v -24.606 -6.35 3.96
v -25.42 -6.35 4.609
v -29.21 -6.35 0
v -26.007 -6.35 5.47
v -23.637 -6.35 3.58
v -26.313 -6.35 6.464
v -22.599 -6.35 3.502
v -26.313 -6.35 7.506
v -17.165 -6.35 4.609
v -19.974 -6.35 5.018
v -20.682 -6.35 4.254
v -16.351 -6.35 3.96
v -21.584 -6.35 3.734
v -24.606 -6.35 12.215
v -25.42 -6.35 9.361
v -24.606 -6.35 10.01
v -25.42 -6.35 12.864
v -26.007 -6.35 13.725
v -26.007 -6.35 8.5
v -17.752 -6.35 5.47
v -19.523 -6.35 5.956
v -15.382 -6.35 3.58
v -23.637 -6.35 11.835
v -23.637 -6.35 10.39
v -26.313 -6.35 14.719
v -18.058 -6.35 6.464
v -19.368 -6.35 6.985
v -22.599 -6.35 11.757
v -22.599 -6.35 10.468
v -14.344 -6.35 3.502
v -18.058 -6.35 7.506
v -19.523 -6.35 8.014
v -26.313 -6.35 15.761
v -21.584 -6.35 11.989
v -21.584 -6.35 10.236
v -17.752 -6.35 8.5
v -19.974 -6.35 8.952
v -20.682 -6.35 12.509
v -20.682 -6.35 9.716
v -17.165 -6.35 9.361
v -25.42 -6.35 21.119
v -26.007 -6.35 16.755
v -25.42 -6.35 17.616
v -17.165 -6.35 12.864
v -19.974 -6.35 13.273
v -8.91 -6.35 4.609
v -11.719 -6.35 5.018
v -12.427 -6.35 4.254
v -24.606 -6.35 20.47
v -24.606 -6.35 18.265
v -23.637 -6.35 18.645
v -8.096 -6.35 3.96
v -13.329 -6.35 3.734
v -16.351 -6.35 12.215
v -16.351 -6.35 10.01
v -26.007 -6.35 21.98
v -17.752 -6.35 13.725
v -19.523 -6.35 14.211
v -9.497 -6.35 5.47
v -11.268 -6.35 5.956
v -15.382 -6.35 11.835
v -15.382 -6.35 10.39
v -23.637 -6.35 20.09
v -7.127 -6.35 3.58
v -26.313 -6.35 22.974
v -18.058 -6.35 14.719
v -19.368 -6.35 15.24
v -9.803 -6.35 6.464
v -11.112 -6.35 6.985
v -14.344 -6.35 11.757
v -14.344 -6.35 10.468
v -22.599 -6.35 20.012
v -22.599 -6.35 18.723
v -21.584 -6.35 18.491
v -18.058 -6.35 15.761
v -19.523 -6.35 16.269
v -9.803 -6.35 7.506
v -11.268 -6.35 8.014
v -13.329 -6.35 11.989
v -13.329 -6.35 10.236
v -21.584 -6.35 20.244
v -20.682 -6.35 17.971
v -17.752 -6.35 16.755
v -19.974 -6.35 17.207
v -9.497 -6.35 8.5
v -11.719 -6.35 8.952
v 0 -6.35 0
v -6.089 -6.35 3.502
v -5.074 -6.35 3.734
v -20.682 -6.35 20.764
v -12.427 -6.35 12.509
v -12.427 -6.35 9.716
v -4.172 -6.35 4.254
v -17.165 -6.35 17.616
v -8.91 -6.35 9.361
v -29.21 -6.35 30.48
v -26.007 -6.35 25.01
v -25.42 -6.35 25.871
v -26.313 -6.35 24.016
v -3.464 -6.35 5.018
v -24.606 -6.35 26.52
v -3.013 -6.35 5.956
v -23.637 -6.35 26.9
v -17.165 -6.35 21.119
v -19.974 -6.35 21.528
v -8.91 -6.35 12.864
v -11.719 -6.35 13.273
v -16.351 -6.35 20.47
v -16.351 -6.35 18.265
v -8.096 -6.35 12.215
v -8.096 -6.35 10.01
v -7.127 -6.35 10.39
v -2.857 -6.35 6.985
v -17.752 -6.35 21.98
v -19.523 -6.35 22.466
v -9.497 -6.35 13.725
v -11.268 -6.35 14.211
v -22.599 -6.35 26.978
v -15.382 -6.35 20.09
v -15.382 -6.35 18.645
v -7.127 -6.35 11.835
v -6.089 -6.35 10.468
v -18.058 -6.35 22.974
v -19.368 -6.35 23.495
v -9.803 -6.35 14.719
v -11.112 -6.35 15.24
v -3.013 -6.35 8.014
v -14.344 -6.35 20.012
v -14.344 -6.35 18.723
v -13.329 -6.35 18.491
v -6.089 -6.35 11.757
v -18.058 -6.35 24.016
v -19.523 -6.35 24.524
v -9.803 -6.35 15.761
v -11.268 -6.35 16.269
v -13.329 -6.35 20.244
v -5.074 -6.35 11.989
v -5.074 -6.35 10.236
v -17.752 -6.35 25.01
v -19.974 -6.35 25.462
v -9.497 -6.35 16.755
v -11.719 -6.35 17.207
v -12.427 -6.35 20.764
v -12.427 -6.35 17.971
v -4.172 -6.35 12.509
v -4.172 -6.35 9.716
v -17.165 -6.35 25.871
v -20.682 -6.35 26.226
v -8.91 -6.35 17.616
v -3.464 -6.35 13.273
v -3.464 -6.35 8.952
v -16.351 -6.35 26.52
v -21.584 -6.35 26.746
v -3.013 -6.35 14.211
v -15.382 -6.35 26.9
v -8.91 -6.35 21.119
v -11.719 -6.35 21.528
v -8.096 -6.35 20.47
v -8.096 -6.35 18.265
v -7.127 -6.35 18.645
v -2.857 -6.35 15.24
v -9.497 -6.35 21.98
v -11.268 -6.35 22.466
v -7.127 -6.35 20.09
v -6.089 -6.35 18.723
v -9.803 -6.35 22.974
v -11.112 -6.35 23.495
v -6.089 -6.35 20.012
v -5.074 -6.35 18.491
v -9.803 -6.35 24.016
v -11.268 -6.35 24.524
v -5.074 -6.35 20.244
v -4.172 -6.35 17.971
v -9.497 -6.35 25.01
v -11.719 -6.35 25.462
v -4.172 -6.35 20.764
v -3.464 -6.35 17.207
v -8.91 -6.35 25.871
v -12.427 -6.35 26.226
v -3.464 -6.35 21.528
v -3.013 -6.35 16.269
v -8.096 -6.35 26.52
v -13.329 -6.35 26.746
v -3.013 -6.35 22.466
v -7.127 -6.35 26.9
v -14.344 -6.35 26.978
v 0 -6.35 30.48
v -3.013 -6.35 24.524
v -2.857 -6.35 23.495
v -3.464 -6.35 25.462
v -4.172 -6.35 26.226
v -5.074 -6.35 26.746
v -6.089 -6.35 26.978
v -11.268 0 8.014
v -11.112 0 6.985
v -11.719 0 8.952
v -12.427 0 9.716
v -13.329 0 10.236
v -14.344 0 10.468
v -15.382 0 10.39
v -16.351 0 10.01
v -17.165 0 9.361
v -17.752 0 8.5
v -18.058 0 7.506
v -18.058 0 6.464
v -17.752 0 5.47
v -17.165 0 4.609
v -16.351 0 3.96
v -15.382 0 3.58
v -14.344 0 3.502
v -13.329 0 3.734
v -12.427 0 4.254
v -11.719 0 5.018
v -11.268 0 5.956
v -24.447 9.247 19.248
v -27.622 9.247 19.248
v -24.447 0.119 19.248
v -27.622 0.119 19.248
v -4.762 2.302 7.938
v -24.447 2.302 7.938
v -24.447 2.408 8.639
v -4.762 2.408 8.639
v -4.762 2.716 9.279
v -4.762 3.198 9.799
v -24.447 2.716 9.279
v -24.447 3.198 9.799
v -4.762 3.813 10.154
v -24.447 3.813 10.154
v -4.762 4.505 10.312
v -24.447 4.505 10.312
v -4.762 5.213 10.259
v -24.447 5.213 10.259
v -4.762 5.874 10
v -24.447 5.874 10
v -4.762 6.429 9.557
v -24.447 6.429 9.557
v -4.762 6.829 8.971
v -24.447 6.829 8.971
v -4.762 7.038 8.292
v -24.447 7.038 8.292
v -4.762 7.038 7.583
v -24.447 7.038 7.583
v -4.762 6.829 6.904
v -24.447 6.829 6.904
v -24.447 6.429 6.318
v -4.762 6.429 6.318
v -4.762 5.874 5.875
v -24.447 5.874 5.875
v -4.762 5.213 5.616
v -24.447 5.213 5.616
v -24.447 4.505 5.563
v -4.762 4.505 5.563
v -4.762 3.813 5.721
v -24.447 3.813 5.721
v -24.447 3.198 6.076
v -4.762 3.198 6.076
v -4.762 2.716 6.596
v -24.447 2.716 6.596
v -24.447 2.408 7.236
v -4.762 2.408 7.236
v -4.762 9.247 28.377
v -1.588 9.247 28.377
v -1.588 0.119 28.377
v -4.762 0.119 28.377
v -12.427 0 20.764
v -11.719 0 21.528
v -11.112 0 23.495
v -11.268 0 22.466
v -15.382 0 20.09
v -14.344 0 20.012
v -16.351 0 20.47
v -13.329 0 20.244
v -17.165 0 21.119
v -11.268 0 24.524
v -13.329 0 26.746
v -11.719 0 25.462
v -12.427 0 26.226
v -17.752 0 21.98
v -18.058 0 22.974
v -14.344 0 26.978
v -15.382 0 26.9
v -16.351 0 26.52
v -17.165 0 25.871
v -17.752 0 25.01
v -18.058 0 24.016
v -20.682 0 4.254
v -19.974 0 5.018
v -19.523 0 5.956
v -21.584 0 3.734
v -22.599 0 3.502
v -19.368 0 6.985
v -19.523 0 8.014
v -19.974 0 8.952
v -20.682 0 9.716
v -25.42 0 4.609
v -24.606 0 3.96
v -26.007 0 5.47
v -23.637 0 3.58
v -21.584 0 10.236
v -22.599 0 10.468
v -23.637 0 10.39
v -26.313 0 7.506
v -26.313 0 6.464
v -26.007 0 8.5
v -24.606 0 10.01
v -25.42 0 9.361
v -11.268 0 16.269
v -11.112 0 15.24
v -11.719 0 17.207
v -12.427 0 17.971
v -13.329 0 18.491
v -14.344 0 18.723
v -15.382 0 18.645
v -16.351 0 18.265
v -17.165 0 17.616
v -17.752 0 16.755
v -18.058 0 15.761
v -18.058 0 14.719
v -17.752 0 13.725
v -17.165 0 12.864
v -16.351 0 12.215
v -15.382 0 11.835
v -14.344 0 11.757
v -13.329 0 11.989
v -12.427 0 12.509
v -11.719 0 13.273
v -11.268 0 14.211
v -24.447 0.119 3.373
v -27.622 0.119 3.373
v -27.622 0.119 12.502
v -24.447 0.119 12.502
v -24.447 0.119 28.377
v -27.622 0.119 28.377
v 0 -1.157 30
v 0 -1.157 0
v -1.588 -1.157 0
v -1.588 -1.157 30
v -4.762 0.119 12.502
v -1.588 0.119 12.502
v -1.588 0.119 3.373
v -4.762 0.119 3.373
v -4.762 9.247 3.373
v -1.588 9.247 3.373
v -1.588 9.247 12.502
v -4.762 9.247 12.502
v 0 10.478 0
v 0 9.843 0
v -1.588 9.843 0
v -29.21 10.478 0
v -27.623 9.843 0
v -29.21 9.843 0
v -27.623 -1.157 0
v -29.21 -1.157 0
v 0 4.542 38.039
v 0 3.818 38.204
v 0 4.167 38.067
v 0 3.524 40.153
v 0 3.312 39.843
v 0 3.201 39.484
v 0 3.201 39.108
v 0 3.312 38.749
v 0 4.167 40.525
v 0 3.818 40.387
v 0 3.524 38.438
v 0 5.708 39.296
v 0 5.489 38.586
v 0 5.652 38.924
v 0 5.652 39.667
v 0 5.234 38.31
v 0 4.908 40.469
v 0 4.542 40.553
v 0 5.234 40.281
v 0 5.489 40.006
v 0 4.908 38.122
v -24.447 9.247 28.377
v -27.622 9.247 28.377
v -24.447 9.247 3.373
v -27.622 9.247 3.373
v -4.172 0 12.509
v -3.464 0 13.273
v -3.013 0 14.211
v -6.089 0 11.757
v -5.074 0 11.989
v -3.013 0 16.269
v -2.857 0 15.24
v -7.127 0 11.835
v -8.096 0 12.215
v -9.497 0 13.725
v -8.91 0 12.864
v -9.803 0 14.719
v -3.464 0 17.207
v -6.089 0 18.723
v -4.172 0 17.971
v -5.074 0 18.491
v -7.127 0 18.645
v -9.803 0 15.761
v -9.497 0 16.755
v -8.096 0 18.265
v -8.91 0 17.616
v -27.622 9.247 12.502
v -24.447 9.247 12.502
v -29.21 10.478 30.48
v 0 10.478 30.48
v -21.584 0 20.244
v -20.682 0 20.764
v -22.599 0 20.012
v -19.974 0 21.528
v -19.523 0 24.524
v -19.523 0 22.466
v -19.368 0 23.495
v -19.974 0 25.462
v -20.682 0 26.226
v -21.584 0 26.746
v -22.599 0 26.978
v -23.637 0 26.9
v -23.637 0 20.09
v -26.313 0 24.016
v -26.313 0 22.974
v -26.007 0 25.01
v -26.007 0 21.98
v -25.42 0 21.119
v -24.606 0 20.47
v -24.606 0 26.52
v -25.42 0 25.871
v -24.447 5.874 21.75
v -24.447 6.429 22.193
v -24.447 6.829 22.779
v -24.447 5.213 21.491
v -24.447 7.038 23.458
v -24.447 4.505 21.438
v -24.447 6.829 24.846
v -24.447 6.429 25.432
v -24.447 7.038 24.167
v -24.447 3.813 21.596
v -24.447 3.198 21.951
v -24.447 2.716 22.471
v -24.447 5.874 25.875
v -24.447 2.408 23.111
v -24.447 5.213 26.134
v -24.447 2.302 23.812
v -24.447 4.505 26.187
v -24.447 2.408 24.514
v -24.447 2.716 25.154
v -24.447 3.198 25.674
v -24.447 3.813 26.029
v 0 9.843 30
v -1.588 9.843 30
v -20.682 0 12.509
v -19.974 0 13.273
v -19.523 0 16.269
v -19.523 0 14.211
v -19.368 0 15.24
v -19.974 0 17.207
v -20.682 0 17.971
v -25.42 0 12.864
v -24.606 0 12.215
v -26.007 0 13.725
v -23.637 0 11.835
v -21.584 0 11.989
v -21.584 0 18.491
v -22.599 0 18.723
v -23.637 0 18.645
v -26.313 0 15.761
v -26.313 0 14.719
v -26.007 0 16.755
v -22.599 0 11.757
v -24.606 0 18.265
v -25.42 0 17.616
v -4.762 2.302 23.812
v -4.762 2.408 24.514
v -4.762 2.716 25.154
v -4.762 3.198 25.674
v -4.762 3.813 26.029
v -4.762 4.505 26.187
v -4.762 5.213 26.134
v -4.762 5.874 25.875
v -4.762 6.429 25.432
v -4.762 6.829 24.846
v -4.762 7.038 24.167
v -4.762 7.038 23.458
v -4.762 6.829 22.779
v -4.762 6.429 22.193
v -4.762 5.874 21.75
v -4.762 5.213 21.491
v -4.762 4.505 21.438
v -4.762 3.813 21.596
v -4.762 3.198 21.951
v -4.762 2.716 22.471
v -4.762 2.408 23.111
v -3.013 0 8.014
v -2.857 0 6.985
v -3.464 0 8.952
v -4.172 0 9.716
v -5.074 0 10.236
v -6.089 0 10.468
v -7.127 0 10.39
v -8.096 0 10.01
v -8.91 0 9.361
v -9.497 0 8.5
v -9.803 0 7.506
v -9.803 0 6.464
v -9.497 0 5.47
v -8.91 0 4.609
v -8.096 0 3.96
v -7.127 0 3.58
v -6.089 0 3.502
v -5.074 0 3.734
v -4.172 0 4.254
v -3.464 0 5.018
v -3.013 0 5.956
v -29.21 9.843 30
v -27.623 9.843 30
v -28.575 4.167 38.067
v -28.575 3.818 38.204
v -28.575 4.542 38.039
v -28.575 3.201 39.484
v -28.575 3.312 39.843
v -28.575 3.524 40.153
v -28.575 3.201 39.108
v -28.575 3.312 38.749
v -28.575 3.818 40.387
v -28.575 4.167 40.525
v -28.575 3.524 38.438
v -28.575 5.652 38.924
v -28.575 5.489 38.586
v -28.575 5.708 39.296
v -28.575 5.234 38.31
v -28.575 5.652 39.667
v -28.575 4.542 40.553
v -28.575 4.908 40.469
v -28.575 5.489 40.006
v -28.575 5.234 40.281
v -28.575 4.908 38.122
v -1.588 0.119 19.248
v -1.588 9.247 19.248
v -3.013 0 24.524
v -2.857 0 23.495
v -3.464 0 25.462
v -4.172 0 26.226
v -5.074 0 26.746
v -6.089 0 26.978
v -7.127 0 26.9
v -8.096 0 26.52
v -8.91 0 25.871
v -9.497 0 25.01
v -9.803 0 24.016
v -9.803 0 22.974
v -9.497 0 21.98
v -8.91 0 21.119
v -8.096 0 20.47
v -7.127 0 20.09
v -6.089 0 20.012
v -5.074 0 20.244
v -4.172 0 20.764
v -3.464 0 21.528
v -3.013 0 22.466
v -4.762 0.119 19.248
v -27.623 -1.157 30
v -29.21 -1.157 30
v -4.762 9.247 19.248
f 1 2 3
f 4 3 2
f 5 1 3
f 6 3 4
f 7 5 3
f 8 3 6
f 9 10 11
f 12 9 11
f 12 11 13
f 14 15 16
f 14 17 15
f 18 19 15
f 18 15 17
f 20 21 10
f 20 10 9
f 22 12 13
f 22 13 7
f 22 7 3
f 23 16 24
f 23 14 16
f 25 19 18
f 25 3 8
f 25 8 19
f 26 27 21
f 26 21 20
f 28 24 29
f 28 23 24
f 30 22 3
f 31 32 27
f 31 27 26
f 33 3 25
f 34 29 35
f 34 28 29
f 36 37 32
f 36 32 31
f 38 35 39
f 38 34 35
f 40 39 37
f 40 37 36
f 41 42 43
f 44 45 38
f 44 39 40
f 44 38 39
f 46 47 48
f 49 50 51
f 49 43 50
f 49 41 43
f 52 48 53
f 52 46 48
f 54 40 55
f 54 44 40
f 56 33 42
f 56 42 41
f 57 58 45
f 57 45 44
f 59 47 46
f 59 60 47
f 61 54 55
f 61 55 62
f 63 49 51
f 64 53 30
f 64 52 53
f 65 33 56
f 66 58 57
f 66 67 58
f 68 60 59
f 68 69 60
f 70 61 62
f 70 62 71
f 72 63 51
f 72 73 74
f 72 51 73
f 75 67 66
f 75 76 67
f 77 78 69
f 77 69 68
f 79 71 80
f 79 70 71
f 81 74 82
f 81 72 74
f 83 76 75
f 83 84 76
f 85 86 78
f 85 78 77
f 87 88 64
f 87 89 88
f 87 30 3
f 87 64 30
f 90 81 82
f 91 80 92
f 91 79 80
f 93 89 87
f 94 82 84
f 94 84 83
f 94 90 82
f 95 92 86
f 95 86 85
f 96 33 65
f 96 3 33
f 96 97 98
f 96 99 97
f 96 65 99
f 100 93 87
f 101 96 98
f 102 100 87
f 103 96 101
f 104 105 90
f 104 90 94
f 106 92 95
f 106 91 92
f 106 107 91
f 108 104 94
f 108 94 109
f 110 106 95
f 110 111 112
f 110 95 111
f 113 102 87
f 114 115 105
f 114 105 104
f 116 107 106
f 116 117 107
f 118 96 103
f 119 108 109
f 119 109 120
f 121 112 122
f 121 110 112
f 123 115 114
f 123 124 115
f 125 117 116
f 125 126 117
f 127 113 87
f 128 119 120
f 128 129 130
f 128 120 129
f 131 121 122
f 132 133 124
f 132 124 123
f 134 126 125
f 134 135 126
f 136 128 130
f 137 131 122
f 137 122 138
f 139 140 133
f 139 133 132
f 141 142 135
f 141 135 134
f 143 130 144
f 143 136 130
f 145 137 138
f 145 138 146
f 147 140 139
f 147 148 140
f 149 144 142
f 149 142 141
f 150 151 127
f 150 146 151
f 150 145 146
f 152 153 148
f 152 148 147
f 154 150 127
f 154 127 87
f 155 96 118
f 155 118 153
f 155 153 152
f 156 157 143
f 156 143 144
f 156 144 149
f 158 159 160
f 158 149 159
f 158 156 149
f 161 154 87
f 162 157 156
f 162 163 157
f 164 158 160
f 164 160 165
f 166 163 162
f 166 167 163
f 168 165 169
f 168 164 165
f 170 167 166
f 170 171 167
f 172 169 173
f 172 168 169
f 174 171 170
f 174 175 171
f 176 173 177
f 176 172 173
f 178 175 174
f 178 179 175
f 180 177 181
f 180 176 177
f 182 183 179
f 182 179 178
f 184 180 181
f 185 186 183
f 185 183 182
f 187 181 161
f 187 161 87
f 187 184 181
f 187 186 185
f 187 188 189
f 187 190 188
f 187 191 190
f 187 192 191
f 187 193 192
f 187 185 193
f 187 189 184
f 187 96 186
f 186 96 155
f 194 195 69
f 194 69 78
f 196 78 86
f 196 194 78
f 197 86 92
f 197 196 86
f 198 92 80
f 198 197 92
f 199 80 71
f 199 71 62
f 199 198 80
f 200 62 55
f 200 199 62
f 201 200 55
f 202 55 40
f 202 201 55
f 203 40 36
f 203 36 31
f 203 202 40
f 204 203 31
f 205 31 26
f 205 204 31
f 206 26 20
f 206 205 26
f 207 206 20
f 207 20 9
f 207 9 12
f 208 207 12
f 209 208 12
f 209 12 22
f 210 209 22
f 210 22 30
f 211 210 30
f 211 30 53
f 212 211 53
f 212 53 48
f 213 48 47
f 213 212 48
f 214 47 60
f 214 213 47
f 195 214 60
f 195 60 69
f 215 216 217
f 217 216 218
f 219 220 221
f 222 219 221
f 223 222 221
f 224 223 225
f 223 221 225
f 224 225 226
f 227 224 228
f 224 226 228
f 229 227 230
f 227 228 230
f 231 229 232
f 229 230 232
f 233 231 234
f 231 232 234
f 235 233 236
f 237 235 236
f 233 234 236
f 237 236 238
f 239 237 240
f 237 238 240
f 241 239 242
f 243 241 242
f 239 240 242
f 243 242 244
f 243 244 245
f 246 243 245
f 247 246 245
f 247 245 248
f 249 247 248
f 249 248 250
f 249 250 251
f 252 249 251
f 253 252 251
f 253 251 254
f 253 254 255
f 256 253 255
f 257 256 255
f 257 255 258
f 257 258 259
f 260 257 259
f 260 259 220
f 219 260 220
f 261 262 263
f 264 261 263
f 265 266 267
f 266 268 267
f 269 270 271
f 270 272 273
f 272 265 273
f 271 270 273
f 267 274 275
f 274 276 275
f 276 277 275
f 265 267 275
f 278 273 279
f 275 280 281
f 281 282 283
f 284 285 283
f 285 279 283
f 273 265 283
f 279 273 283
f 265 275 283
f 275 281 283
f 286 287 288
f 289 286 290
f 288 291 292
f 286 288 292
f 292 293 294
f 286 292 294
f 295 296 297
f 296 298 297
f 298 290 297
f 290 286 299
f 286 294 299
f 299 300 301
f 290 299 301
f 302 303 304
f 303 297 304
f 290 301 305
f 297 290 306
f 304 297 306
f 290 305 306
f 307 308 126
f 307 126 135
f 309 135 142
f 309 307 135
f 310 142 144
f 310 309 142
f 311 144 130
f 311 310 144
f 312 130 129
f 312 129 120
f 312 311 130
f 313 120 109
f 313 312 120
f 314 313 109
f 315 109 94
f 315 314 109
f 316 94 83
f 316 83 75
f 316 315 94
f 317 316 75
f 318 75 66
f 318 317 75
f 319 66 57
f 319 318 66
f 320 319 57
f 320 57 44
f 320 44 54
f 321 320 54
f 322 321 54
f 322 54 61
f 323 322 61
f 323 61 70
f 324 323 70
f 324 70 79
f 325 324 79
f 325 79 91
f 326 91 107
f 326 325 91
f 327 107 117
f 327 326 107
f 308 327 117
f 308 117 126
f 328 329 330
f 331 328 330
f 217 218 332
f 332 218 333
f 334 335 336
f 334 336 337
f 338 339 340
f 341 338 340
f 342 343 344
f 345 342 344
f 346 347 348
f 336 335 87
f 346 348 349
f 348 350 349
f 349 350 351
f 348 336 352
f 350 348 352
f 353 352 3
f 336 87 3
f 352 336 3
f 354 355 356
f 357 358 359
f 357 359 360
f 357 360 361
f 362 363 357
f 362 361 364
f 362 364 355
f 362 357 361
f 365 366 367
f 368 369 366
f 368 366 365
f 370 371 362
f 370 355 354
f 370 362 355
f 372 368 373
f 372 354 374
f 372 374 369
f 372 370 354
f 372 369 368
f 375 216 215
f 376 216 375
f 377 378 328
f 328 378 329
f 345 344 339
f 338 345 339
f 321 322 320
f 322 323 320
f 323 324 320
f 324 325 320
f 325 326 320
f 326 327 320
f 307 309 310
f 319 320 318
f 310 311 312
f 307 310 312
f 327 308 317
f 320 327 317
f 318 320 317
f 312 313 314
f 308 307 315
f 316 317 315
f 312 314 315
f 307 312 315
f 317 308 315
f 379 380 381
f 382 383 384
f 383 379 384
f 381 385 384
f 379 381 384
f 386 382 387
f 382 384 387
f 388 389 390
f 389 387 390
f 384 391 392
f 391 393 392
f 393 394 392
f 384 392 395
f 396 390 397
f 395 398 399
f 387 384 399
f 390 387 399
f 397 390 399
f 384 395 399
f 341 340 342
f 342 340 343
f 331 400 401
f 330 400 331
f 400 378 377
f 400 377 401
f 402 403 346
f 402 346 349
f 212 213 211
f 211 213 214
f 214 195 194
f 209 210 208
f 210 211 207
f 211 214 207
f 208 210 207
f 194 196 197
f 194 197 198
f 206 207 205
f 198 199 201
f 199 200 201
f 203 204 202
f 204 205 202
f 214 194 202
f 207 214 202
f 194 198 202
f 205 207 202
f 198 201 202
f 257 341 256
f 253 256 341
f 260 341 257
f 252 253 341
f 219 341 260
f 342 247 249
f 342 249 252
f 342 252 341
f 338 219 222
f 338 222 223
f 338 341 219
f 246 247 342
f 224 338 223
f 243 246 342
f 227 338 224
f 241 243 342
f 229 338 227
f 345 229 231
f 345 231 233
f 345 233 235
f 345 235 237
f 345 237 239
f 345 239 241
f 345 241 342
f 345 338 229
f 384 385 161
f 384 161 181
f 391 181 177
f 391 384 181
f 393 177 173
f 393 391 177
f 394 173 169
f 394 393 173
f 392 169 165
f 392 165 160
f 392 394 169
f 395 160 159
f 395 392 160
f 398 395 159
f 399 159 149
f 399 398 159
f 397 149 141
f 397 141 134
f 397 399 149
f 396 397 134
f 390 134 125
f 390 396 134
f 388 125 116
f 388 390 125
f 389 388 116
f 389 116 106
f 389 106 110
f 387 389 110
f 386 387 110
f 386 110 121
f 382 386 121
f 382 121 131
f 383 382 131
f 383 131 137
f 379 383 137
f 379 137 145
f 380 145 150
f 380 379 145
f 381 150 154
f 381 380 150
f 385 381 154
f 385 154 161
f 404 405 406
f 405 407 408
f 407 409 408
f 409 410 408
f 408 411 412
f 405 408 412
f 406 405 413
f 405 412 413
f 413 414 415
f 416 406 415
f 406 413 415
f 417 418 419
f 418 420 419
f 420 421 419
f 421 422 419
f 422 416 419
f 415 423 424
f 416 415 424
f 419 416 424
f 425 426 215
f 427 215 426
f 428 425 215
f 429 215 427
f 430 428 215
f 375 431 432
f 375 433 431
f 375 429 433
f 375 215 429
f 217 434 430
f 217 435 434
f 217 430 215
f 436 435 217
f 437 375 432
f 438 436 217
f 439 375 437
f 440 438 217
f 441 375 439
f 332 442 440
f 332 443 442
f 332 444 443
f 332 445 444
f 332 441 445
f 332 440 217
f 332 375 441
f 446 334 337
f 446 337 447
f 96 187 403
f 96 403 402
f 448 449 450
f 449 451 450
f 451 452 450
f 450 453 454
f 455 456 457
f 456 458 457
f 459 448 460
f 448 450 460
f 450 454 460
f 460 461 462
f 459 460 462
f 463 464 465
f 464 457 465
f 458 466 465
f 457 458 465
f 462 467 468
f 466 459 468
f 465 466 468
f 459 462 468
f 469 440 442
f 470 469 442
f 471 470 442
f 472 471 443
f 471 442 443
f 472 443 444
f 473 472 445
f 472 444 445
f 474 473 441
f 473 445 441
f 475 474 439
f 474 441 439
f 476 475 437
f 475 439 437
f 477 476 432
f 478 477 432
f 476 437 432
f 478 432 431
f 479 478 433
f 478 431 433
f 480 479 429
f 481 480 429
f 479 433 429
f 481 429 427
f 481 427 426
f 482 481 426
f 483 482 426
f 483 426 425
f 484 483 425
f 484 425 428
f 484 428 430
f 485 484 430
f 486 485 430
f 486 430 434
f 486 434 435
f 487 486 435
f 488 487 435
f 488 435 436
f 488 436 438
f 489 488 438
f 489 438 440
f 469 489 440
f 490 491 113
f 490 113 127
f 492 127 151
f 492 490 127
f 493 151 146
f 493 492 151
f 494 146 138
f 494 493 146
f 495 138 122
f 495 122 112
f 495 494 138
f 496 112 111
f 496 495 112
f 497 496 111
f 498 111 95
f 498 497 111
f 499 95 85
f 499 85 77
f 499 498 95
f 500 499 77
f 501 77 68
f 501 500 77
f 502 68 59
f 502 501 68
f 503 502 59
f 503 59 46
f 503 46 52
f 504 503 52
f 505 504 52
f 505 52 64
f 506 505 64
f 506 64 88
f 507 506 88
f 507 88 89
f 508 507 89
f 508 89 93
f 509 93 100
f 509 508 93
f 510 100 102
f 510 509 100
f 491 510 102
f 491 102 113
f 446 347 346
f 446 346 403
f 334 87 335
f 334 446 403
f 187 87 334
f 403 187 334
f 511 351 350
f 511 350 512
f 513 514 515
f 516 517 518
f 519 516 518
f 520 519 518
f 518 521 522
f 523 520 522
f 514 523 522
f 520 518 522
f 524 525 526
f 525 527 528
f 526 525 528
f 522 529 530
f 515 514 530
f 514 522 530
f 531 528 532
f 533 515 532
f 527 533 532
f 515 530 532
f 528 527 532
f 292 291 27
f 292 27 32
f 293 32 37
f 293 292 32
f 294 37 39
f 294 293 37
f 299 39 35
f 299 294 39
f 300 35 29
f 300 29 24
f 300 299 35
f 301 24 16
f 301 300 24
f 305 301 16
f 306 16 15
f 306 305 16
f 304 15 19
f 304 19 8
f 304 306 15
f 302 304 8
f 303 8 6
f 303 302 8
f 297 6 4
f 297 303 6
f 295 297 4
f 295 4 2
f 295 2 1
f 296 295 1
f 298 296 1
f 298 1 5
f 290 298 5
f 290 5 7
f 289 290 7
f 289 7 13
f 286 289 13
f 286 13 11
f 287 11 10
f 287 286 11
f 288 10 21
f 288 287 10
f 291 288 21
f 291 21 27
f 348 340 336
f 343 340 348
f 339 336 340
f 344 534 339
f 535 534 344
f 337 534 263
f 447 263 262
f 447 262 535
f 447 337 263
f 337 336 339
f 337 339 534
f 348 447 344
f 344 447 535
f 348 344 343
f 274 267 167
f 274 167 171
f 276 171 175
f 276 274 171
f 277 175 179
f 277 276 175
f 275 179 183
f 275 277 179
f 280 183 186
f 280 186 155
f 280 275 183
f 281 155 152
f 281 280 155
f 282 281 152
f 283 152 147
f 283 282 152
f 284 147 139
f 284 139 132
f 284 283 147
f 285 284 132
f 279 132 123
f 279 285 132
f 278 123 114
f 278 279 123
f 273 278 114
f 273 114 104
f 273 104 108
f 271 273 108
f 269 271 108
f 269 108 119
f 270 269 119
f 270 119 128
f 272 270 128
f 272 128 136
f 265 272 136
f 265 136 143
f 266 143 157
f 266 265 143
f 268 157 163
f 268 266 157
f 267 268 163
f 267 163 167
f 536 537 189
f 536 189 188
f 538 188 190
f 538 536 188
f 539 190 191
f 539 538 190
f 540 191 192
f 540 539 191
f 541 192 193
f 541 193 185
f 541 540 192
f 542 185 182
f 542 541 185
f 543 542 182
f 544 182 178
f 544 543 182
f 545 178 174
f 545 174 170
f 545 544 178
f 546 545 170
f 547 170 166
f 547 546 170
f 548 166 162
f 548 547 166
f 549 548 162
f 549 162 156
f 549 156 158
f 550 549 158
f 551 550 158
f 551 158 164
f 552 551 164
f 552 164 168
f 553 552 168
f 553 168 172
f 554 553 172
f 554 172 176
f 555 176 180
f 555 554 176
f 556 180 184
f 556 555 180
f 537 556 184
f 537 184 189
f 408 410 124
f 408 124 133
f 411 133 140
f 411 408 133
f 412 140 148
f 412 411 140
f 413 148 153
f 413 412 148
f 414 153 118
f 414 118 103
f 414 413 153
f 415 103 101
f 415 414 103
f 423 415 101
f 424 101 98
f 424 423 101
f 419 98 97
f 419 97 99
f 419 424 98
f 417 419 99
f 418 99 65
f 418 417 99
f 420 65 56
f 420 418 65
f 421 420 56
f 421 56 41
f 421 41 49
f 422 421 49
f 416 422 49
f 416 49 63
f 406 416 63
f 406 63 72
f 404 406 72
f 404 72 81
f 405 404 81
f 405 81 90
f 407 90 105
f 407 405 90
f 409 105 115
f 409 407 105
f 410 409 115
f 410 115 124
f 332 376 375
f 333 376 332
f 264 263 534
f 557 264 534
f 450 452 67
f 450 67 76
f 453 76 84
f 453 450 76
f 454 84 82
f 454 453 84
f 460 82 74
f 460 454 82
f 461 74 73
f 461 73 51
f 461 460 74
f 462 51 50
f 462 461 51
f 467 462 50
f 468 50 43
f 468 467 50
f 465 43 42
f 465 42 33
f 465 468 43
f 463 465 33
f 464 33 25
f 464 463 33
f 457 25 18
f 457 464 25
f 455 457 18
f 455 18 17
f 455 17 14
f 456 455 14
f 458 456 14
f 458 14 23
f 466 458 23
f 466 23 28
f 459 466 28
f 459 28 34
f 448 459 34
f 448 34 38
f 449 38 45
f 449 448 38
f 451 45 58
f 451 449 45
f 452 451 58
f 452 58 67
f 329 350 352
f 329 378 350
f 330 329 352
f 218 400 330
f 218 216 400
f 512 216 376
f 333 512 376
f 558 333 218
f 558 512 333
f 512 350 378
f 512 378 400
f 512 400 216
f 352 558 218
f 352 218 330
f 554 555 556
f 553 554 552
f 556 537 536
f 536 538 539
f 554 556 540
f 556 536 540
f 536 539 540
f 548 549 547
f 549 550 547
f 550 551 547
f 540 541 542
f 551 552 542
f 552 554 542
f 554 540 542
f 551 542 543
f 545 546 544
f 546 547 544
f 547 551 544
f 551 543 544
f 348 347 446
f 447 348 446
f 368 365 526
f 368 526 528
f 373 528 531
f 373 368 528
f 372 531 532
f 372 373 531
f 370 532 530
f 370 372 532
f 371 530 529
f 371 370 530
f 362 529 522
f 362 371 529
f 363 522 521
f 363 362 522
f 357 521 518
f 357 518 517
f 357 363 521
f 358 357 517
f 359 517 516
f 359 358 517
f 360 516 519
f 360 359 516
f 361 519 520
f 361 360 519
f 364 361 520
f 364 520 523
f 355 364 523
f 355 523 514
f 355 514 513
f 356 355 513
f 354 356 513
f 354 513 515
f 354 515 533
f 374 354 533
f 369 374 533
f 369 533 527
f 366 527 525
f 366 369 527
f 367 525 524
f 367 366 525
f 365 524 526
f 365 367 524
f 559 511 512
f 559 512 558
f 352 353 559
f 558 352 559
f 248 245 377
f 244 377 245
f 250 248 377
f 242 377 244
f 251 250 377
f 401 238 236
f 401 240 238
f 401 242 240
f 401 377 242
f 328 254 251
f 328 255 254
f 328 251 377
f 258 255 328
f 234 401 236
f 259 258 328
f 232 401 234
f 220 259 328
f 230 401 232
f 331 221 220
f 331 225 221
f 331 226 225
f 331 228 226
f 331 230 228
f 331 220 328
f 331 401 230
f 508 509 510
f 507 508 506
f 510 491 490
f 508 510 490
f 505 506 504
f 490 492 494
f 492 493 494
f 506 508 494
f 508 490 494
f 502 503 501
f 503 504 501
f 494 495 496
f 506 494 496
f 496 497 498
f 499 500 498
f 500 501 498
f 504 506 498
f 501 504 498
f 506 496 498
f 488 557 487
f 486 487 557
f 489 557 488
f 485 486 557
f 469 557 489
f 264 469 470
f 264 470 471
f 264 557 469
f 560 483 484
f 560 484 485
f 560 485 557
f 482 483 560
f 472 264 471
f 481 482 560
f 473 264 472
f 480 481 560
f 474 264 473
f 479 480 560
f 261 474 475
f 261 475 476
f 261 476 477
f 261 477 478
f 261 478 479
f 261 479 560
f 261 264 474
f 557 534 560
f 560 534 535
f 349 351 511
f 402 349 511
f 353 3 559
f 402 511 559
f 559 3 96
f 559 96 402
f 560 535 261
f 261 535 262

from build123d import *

# Parameters (mm, degrees)
F0_W      = 29.21
F0_H      = 30.48
F0_R      = 3.4925
F1_DEPTH  = 6.35
F2_W      = 29.21
F2_H      = 30.48
F3_DEPTH  = 10.4775
F4_W      = 11
F4_H      = 30
F5_DEPTH  = 1.5875
F6_W      = 11
F6_H      = 30
F7_DEPTH  = 1.5875
F8_R      = 2.38125
F9_DEPTH  = 27.6235
F10_W     = 9.128126
F10_H     = 9.128125
F12_DEPTH = 3.175
F13_DEPTH = 3.175
F14_R     = 1.260545
F15_DEPTH = 28.575


with BuildPart() as f1:
    # F0 (on Front) → F1 (new body)
    with BuildSketch(Plane.XZ):
        with Locations((-14.605, 15.24)):
            Rectangle(F0_W, F0_H)
        with Locations((-22.86, 6.985)):
            Circle(F0_R, mode=Mode.SUBTRACT)
        with Locations((-14.605, 6.985)):
            Circle(F0_R, mode=Mode.SUBTRACT)
        with Locations((-6.35, 6.985)):
            Circle(F0_R, mode=Mode.SUBTRACT)
        with Locations((-22.86, 15.24)):
            Circle(F0_R, mode=Mode.SUBTRACT)
        with Locations((-14.605, 15.24)):
            Circle(F0_R, mode=Mode.SUBTRACT)
        with Locations((-22.86, 23.495)):
            Circle(F0_R, mode=Mode.SUBTRACT)
        with Locations((-14.605, 23.495)):
            Circle(F0_R, mode=Mode.SUBTRACT)
        with Locations((-6.35, 15.24)):
            Circle(F0_R, mode=Mode.SUBTRACT)
        with Locations((-6.35, 23.495)):
            Circle(F0_R, mode=Mode.SUBTRACT)
    extrude(amount=F1_DEPTH)

    # F2 (on face) → F3 (join)
    with BuildSketch(Plane(origin=(0, 0, 0), x_dir=(-1, 0, 0), z_dir=(0, 1, 0))):
        with Locations((14.605, 15.24)):
            Rectangle(F2_W, F2_H)
    extrude(amount=F3_DEPTH)

    # F4 (on face) → F5 (cut)
    with BuildSketch(Plane.YZ):
        with Locations((4.3425, 15)):
            Rectangle(F4_W, F4_H)
    extrude(amount=-F5_DEPTH, mode=Mode.SUBTRACT)

    # F6 (on face) → F7 (cut)
    with BuildSketch(Plane(origin=(-29.21, 0, 0), x_dir=(0, -1, 0), z_dir=(-1, 0, 0))):
        with Locations((-4.3425, 15)):
            Rectangle(F6_W, F6_H)
    extrude(amount=-F7_DEPTH, mode=Mode.SUBTRACT)

    # F8 (on face) → F9 (cut, through all)
    with BuildSketch(Plane(origin=(-27.6225, 0, 0), x_dir=(0, -1, 0), z_dir=(-1, 0, 0))):
        with Locations((-4.683125, 23.8125)):
            Circle(F8_R)
        with Locations((-4.683125, 7.9375)):
            Circle(F8_R)
    extrude(amount=-F9_DEPTH, mode=Mode.SUBTRACT)

    # F10 (on face) → F12 (cut)
    with BuildSketch(Plane(origin=(-27.6225, 0, 0), x_dir=(0, -1, 0), z_dir=(-1, 0, 0))):
        with Locations((-4.683125, 23.8125)):
            Rectangle(F10_W, F10_H)
        with Locations((-4.683125, 7.937499)):
            Rectangle(F10_W, F10_H)
    extrude(amount=-F12_DEPTH, mode=Mode.SUBTRACT)

    # F11 (on face) → F13 (cut)
    with BuildSketch(Plane.YZ.offset(-1.5875)):
        Polygon((9.247188, 28.376563), (0.119062, 28.376563), (0.119063, 19.248438), (9.247188, 19.248438), align=None)
        Polygon((9.247188, 12.501563), (0.119062, 12.501563), (0.119062, 3.373437), (9.247187, 3.373437), align=None)
    extrude(amount=-F13_DEPTH, mode=Mode.SUBTRACT)


with BuildPart() as f15:
    # F14 (on face) → F15 (new body)
    with BuildSketch(Plane.YZ):
        with Locations((4.447935, 39.295714)):
            Circle(F14_R)
    extrude(amount=-F15_DEPTH)


solid = Compound([f1.part, f15.part])
